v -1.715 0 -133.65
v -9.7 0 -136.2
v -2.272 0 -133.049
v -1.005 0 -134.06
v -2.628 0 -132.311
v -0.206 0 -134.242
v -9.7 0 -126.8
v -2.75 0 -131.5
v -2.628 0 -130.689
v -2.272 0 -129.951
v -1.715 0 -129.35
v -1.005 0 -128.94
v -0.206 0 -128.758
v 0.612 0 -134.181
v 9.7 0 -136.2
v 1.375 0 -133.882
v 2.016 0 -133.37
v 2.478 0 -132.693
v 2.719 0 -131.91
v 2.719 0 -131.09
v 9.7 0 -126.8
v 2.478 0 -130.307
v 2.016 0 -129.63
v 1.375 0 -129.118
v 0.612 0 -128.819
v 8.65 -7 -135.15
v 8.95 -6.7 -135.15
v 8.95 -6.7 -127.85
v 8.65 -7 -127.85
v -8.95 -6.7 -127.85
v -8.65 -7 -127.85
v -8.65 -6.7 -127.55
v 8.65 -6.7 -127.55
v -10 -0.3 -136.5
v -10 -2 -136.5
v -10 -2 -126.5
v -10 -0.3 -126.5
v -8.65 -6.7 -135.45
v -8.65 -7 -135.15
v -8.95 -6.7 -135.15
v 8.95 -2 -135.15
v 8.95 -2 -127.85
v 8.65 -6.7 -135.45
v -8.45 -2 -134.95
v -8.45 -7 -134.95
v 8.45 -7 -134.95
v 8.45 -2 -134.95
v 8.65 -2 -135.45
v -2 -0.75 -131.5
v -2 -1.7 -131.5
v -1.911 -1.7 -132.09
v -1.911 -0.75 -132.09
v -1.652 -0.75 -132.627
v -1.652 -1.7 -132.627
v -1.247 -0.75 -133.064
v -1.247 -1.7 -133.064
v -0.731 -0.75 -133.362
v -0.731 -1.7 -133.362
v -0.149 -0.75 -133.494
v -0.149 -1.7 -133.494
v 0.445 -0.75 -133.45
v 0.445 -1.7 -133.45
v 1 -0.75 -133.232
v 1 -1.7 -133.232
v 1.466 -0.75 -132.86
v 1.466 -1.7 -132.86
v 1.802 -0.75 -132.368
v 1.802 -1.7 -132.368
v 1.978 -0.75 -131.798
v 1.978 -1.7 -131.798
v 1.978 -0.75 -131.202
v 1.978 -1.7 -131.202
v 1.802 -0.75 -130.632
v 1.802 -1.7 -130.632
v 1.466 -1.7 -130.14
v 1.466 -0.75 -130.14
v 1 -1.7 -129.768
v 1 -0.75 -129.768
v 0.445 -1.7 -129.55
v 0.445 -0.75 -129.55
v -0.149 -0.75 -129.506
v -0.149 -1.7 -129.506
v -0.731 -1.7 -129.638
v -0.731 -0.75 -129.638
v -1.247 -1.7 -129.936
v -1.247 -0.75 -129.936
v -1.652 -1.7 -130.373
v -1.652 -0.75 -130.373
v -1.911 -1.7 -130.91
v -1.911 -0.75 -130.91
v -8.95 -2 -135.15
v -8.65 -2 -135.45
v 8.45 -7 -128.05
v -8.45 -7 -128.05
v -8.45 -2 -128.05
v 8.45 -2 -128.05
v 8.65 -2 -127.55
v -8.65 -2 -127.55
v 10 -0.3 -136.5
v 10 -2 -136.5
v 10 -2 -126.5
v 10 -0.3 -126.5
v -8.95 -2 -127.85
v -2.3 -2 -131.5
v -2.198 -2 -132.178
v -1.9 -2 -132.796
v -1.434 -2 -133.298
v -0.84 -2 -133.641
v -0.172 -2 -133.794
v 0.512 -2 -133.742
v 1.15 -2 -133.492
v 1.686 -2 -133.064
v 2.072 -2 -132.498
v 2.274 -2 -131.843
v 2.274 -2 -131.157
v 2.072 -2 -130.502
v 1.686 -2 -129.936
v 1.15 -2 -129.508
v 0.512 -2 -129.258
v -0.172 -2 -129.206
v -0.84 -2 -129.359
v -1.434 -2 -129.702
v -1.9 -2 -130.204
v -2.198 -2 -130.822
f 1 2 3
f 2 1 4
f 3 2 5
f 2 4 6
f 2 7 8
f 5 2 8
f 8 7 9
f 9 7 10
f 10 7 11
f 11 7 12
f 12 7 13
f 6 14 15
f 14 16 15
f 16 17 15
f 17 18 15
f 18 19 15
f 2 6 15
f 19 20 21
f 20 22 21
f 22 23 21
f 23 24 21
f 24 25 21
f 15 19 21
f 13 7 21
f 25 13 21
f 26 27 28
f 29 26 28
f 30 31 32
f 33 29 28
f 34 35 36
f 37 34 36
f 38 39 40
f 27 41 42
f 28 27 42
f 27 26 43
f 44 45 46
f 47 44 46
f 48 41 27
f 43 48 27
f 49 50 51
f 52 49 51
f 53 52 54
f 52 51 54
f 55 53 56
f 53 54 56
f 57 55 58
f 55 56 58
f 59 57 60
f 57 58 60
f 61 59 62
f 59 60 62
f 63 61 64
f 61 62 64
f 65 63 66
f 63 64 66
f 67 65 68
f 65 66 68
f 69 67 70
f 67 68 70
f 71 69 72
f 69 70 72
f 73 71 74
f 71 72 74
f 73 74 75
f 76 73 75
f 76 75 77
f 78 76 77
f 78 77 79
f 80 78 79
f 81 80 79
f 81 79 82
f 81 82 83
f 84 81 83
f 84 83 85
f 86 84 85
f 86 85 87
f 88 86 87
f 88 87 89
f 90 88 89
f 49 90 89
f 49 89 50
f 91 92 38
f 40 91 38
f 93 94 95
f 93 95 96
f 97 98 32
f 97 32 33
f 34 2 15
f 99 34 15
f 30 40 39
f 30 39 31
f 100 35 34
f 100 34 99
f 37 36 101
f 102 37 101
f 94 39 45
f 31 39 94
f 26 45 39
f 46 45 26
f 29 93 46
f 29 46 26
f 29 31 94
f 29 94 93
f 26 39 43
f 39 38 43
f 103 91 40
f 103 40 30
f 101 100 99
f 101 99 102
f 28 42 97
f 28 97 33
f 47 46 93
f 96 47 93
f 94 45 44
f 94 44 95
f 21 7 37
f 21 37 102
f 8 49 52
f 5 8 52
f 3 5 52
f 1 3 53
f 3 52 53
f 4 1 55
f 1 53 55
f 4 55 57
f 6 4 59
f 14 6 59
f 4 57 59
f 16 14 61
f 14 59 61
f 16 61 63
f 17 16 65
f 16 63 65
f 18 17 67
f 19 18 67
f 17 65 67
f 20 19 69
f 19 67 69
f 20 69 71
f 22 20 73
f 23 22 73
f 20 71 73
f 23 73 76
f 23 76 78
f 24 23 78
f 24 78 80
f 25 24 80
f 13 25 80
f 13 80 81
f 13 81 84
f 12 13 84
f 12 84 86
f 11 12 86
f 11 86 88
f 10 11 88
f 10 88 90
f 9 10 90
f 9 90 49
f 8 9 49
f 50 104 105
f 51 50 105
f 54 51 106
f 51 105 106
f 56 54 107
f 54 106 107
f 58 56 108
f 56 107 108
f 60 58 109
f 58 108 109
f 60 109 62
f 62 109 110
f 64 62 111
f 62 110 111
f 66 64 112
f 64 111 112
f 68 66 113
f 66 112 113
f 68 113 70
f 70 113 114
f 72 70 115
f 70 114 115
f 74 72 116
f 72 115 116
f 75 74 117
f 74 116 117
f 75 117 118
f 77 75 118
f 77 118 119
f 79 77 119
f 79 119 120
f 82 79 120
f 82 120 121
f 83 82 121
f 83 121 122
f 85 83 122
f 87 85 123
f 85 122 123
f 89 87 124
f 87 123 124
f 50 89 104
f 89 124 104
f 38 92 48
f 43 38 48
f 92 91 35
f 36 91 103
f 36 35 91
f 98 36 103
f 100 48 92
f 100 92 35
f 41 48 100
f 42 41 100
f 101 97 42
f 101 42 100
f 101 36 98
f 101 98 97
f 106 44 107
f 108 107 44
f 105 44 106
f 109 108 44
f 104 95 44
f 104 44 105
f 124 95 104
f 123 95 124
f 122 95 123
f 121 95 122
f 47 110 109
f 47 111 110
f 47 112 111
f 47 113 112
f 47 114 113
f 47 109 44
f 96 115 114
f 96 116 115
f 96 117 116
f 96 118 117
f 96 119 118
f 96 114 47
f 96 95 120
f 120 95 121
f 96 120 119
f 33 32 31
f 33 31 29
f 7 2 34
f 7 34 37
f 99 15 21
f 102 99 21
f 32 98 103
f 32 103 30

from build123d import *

# Parameters (mm, degrees)
SKETCH008_W         = 20
SKETCH008_H         = 10
PAD052_DEPTH        = 2
SKETCH009_W         = 17.9
SKETCH009_H         = 7.9
PAD053_DEPTH        = 5
SKETCH010_W         = 16.9
SKETCH010_H         = 6.9
POCKET004_DEPTH     = 5
HOLE001_D           = 4
HOLE001_DEPTH       = 2
HOLE001_CSINK_D     = 5.5
HOLE001_CSINK_ANGLE = 90
HOLE001_TIPS_R      = 2
CHAMFER004_SIZE     = 0.3
CHAMFER005_SIZE     = 0.3
CHAMFER055_SIZE     = 0.3


with BuildPart() as part:
    # Sketch008 → Pad052 (new body)
    with BuildSketch(Plane.XZ):
        Rectangle(SKETCH008_W, SKETCH008_H)
    extrude(amount=-PAD052_DEPTH)

    # Sketch009 (on Face5 of Pad052) → Pad053 (join)
    with BuildSketch(Plane.XZ):
        Rectangle(SKETCH009_W, SKETCH009_H)
    extrude(amount=PAD053_DEPTH)

    # Sketch010 (on Face11 of Pad053) → Pocket004 (cut)
    with BuildSketch(Plane.XZ.offset(5)):
        Rectangle(SKETCH010_W, SKETCH010_H)
    extrude(amount=-POCKET004_DEPTH, mode=Mode.SUBTRACT)

    # Hole001
    with Locations(Plane(origin=(0, 2, 0), x_dir=(1, 0, 0), z_dir=(0, 1, 0))):
        with Locations((0, 0)):
            CounterSinkHole(HOLE001_D / 2, HOLE001_CSINK_D / 2, depth=HOLE001_DEPTH, counter_sink_angle=HOLE001_CSINK_ANGLE)

    # Hole001 tips → Hole001 tip 1 section 0
    with BuildSketch(Plane(origin=(0, 0, 0), x_dir=(1, 0, 0), z_dir=(0, 1, 0)), mode=Mode.PRIVATE) as hole001_tip_1_s0:
        Circle(HOLE001_TIPS_R)
    loft([hole001_tip_1_s0.sketch, Vertex(0, -1.201721, 0)], mode=Mode.SUBTRACT)

    # Chamfer004
    chamfer004_edges = [part.edges().sort_by_distance(p)[0] for p in [
        (2, 0, 0),
    ]]
    chamfer(chamfer004_edges, length=CHAMFER004_SIZE)

    # Chamfer005
    chamfer005_edges = [part.edges().sort_by_distance(p)[0] for p in [
        (0, -5, -3.95),
        (-8.95, -5, 0),
        (0, -5, 3.95),
        (8.95, -5, 0),
        (8.95, -2.5, -3.95),
        (-8.95, -2.5, -3.95),
        (8.95, -2.5, 3.95),
        (-8.95, -2.5, 3.95),
    ]]
    chamfer(chamfer005_edges, length=CHAMFER005_SIZE)

    # Chamfer055
    chamfer055_edges = [part.edges().sort_by_distance(p)[0] for p in [
        (0, 2, 5),
        (10, 2, 0),
        (0, 2, -5),
        (-10, 2, 0),
    ]]
    chamfer(chamfer055_edges, length=CHAMFER055_SIZE)


with BuildPart() as part_1:
    # Body018 placement: moved
    add(part.part.moved(Location((0, -2, -131.5))))


solid = part_1.part
